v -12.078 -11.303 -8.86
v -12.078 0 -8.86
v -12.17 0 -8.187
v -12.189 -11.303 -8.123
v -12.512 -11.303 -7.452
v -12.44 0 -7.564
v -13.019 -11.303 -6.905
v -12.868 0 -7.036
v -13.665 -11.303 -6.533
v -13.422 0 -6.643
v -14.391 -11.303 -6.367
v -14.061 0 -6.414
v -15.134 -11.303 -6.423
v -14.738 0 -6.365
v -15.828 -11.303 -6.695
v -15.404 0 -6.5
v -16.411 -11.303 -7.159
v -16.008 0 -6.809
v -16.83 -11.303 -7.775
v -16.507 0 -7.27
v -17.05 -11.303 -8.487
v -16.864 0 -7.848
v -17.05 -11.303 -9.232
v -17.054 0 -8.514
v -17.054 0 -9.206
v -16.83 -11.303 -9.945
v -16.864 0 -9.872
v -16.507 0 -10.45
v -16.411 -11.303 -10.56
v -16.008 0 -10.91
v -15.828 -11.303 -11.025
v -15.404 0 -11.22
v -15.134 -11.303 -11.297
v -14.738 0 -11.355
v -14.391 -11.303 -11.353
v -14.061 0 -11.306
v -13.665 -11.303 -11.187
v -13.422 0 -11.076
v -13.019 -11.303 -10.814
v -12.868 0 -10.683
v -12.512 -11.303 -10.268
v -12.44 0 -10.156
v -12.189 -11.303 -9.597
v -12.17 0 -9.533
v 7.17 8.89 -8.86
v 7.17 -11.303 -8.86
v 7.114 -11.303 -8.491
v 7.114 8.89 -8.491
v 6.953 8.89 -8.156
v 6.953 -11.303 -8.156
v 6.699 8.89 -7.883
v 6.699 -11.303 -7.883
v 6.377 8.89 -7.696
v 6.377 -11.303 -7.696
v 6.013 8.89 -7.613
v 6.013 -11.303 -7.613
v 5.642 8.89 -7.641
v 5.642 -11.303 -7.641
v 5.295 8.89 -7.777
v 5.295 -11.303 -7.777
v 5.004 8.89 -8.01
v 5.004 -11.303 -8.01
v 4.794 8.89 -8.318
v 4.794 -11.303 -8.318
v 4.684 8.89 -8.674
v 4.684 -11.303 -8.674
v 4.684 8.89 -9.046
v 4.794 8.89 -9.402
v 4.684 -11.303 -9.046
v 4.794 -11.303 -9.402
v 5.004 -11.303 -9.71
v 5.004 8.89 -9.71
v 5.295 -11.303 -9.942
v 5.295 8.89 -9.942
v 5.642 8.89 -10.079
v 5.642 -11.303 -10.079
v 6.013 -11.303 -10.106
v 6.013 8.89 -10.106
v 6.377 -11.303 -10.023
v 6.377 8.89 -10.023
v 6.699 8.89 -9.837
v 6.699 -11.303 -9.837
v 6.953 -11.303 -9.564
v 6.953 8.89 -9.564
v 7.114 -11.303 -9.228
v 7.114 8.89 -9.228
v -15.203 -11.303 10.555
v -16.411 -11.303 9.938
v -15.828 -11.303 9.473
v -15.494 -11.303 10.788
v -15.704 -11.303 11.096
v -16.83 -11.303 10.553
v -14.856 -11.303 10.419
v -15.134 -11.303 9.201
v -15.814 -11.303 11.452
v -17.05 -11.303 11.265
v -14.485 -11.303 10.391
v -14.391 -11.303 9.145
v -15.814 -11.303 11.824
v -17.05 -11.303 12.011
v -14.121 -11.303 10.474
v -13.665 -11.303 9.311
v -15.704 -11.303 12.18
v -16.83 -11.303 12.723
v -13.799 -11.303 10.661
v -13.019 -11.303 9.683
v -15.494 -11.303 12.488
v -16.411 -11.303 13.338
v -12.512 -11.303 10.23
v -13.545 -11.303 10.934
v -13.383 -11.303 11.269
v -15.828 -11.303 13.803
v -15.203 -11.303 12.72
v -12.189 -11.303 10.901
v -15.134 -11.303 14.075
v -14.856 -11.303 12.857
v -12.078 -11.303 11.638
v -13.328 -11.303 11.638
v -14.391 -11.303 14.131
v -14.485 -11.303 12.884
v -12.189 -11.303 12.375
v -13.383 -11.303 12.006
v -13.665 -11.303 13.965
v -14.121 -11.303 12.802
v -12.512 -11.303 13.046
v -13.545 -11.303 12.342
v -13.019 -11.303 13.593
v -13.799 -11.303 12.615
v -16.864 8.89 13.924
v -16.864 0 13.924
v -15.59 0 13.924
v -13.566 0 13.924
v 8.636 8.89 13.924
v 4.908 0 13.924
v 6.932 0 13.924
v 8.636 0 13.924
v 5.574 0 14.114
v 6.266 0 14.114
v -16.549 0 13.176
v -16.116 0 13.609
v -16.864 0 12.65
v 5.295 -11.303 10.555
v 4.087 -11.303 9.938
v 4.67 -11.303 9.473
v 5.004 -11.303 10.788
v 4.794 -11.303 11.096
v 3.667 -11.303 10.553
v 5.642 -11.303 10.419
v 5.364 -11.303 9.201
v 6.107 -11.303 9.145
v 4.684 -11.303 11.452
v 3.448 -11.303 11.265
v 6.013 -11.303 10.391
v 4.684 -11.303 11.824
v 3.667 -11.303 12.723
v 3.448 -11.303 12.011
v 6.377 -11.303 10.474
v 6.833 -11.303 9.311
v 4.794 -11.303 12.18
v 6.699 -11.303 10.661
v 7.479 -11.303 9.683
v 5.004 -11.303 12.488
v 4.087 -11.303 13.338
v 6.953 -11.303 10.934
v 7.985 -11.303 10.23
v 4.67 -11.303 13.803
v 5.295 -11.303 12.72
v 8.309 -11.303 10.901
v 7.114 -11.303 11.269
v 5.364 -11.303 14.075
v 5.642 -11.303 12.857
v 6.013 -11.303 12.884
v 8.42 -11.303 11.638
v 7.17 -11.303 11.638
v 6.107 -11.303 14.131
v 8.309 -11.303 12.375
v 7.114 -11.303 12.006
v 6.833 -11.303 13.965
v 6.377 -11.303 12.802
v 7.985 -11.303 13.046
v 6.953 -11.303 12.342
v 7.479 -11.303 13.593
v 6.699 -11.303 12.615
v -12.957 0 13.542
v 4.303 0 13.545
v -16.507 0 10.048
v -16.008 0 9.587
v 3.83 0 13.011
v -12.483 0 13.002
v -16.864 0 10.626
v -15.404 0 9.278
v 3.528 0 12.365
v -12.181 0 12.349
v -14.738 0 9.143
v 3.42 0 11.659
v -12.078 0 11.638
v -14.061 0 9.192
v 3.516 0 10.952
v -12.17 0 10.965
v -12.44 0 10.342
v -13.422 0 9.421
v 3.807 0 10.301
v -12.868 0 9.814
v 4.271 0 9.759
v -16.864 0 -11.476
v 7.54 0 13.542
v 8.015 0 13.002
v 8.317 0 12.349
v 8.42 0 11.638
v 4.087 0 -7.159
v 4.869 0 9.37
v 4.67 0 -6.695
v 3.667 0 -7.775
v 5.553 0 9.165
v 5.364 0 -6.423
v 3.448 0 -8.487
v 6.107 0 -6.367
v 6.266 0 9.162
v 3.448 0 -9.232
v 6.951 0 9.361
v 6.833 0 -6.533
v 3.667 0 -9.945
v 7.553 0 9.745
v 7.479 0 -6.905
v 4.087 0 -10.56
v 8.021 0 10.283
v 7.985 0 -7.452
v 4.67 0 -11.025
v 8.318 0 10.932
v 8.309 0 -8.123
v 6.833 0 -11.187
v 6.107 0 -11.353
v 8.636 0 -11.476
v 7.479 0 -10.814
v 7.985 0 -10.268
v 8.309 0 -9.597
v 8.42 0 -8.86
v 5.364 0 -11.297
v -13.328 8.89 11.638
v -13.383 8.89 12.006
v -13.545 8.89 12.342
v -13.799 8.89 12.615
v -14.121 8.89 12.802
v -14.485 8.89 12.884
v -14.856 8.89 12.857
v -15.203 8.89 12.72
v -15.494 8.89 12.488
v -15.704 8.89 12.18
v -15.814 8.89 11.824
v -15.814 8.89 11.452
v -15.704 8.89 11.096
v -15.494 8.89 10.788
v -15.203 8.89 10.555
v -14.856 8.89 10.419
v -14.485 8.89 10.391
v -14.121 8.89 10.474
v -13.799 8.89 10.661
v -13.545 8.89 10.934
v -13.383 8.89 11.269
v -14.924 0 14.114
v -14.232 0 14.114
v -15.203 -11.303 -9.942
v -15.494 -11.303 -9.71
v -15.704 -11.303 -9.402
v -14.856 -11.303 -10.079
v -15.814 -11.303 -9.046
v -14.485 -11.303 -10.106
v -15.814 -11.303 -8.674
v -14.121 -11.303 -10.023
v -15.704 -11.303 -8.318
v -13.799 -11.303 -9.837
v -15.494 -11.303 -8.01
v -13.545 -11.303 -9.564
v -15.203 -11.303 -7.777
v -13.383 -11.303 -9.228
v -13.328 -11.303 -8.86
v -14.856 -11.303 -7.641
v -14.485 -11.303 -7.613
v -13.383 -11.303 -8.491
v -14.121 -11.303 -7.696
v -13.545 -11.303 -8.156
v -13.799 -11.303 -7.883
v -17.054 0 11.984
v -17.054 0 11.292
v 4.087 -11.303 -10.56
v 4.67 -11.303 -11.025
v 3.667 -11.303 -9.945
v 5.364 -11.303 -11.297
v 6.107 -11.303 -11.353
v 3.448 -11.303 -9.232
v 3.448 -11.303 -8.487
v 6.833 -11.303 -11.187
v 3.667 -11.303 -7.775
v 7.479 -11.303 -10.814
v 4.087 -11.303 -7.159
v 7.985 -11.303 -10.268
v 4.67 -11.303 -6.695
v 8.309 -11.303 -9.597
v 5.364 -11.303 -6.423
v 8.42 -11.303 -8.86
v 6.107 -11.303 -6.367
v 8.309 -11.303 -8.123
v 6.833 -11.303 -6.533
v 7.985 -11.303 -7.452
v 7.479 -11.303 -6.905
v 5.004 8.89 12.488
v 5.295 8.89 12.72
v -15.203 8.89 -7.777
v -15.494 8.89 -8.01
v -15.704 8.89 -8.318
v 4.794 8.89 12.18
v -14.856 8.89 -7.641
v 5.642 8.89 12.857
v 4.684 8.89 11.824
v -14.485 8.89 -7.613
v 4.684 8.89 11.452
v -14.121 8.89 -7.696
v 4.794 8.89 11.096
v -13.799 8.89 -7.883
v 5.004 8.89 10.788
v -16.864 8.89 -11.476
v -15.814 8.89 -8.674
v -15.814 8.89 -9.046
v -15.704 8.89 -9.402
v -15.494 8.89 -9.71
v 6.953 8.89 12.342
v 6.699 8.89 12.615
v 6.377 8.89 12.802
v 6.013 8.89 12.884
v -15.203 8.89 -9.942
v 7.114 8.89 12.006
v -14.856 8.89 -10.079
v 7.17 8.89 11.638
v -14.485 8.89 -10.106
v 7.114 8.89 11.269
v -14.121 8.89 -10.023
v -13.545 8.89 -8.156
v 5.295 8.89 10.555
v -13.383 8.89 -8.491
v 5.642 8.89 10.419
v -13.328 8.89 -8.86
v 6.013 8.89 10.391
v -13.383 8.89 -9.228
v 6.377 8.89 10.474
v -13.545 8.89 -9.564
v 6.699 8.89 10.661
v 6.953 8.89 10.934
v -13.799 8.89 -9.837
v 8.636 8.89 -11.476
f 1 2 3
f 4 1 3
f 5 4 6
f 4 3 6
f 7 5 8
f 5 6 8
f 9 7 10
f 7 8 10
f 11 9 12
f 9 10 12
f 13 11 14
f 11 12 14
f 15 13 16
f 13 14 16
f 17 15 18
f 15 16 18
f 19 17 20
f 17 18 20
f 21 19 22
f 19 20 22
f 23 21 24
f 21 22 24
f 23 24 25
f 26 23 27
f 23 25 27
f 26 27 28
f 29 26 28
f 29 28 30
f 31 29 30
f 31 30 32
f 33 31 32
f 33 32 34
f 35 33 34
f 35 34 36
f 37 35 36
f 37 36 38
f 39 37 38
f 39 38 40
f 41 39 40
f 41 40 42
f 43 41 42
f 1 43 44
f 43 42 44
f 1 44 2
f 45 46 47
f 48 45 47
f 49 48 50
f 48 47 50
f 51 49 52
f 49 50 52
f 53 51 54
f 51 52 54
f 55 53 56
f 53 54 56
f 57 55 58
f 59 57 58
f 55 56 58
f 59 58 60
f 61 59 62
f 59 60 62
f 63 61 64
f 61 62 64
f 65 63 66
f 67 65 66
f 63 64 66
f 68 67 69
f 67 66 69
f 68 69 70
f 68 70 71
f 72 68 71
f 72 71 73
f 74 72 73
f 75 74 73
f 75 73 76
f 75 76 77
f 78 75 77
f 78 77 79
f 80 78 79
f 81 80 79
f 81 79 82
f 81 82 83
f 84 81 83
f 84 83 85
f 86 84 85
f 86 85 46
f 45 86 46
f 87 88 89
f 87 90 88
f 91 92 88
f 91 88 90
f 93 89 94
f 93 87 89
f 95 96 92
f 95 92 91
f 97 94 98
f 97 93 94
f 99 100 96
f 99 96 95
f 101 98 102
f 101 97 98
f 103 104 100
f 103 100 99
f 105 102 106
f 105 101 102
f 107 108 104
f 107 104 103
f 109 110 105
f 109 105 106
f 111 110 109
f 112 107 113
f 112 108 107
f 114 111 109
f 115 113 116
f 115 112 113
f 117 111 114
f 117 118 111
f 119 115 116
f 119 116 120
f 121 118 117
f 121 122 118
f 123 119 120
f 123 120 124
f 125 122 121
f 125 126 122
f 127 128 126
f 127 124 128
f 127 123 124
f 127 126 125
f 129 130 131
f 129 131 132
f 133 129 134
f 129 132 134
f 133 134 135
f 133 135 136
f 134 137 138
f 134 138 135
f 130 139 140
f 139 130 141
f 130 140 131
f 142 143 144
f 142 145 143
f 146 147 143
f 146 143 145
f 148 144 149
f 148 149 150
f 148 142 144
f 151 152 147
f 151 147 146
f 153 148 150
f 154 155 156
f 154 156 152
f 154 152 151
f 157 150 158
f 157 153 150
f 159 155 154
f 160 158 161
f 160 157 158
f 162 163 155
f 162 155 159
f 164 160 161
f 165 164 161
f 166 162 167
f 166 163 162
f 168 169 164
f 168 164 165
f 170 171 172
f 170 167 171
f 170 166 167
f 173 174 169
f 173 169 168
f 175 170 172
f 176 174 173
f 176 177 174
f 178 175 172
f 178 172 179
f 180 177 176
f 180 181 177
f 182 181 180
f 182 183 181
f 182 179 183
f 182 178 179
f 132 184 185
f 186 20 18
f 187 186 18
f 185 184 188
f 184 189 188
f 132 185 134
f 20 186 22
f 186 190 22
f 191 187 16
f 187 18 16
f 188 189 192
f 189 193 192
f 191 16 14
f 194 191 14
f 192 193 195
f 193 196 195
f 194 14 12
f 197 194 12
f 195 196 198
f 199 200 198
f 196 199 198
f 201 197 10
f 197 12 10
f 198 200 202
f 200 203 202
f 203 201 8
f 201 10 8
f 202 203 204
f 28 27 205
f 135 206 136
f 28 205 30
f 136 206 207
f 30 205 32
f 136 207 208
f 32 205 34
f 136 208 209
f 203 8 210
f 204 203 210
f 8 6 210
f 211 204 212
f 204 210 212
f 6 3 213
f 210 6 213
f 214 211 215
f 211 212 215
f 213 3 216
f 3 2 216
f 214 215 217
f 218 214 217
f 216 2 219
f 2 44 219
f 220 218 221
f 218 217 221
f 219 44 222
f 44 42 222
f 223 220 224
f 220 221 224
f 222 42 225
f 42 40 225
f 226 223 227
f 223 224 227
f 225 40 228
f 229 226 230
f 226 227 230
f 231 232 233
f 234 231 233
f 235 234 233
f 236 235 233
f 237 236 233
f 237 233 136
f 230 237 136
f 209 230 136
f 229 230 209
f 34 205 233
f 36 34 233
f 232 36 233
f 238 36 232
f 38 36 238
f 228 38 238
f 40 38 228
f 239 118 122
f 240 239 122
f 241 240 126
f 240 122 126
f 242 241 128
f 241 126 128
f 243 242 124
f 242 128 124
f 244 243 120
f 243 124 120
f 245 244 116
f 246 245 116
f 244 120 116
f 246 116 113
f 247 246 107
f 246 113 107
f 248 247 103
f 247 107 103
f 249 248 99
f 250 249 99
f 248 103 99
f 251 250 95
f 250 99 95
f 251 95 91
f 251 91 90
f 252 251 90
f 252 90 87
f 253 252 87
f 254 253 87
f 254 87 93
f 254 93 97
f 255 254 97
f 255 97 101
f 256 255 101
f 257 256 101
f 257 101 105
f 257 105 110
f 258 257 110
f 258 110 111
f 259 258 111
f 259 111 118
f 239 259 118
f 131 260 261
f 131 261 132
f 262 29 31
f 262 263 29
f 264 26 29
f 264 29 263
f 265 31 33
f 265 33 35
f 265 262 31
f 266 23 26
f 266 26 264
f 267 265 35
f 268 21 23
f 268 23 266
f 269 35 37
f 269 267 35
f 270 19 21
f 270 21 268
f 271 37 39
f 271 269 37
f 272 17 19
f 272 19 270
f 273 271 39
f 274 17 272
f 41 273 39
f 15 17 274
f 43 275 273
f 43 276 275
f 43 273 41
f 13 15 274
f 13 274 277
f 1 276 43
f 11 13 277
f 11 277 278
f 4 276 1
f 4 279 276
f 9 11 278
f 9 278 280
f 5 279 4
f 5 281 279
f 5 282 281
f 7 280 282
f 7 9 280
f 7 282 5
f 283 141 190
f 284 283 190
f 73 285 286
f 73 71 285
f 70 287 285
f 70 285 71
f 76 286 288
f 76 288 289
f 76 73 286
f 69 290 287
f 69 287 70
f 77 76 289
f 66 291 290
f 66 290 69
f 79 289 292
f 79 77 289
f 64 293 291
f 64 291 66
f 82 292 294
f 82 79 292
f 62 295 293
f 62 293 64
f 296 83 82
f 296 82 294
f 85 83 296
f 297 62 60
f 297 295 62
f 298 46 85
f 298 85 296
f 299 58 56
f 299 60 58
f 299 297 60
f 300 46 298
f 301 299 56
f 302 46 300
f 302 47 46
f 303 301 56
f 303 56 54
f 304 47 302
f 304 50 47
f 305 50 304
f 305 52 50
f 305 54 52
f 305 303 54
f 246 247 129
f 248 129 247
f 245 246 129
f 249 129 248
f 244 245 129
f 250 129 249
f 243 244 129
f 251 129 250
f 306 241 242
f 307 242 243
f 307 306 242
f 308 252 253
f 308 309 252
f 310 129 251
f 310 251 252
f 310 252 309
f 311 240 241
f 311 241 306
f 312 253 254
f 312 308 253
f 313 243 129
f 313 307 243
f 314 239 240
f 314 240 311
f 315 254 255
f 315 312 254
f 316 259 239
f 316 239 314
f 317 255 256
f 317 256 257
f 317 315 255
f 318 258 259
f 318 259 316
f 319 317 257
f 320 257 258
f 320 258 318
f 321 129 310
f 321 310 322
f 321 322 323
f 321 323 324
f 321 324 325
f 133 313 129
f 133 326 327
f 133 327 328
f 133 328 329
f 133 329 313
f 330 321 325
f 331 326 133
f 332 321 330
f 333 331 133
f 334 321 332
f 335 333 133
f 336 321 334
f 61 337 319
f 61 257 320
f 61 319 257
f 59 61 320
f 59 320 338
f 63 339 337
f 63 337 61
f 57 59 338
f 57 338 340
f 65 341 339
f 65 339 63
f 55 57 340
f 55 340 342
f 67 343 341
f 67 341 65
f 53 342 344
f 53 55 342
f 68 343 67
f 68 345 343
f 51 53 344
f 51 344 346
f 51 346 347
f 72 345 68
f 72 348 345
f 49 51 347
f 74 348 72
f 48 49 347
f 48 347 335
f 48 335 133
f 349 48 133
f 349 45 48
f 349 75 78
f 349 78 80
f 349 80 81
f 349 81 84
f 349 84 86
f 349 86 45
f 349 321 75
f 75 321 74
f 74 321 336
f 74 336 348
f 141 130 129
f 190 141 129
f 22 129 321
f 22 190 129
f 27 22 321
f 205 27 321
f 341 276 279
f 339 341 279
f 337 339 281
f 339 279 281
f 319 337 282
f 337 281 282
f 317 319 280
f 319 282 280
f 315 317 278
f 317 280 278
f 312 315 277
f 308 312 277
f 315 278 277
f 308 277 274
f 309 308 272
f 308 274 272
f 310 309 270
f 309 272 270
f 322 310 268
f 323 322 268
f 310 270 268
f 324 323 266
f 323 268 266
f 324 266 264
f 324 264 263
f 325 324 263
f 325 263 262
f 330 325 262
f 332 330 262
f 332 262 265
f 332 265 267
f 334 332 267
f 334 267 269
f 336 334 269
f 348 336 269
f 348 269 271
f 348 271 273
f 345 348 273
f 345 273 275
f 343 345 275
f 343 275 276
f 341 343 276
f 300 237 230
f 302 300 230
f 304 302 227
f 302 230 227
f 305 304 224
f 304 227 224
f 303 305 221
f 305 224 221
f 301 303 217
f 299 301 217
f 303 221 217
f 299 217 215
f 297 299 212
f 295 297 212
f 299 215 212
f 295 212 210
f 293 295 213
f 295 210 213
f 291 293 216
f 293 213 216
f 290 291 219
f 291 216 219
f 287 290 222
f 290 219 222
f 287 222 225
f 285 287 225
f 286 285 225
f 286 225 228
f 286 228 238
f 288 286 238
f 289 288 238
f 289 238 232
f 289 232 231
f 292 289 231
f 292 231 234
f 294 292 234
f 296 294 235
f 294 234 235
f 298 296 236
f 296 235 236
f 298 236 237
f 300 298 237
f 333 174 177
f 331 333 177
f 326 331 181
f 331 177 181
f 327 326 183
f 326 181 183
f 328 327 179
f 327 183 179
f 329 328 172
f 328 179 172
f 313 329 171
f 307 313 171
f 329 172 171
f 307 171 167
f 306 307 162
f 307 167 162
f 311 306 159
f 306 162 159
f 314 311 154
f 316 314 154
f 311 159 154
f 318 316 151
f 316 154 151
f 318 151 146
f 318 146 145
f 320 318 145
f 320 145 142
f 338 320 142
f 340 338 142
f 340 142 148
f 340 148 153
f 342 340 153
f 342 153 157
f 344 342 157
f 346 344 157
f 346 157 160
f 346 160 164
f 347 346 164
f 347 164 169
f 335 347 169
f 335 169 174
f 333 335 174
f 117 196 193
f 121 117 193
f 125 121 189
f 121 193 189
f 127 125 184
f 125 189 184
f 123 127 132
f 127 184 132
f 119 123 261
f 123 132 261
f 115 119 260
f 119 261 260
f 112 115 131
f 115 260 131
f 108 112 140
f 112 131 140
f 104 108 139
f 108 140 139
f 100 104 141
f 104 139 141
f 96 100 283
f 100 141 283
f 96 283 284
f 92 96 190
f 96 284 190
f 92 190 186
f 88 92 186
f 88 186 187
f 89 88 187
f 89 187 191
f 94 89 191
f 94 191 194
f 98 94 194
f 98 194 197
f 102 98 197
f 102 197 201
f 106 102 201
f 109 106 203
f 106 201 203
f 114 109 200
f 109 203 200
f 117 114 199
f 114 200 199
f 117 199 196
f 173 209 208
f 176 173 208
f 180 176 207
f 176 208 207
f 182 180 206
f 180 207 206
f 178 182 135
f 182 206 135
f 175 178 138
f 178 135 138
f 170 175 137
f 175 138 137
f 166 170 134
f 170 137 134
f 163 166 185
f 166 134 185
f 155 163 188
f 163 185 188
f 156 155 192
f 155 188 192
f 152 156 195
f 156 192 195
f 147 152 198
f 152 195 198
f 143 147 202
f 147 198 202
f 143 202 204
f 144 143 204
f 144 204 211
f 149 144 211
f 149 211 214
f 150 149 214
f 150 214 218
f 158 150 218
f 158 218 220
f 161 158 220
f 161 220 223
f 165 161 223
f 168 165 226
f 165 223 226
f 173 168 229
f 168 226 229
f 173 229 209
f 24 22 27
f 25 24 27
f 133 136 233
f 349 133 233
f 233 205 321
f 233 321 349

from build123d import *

# Parameters (mm, degrees)
SKETCH1_W           = 25.5
SKETCH1_H           = 25.4
BOSS_EXTRUDE1_DEPTH = 8.89
SKETCH2_R           = 2.5
BOSS_EXTRUDE2_DEPTH = 11.303
SKETCH3_R           = 1.25
CUT_EXTRUDE1_DEPTH  = 21.193


with BuildPart() as part:
    # Sketch1 → Boss-Extrude1 (new body)
    with BuildSketch(Plane(origin=(0, 0, 0), x_dir=(1, 0, 0), z_dir=(0, 1, 0))):
        with Locations((-4.113944862, -1.223942607)):
            Rectangle(SKETCH1_W, SKETCH1_H)
    extrude(amount=BOSS_EXTRUDE1_DEPTH)

    # Sketch2 → Boss-Extrude2 (add)
    with BuildSketch(Plane.XZ):
        with Locations((-14.577944862, 11.637942607)):
            Circle(SKETCH2_R)
        with Locations((5.919855138, 11.637942607)):
            Circle(SKETCH2_R)
        with Locations((5.919855138, -8.859857393)):
            Circle(SKETCH2_R)
        with Locations((-14.577944862, -8.859857393)):
            Circle(SKETCH2_R)
    extrude(amount=BOSS_EXTRUDE2_DEPTH)

    # Sketch3 → Cut-Extrude1 (cut, through all)
    with BuildSketch(Plane.XZ.offset(11.303)):
        with Locations((-14.577944862, 11.637942607)):
            Circle(SKETCH3_R)
        with Locations((-14.577944862, -8.859857393)):
            Circle(SKETCH3_R)
        with Locations((5.919855138, -8.859857393)):
            Circle(SKETCH3_R)
        with Locations((5.919855138, 11.637942607)):
            Circle(SKETCH3_R)
    extrude(amount=-CUT_EXTRUDE1_DEPTH, mode=Mode.SUBTRACT)


solid = part.part
